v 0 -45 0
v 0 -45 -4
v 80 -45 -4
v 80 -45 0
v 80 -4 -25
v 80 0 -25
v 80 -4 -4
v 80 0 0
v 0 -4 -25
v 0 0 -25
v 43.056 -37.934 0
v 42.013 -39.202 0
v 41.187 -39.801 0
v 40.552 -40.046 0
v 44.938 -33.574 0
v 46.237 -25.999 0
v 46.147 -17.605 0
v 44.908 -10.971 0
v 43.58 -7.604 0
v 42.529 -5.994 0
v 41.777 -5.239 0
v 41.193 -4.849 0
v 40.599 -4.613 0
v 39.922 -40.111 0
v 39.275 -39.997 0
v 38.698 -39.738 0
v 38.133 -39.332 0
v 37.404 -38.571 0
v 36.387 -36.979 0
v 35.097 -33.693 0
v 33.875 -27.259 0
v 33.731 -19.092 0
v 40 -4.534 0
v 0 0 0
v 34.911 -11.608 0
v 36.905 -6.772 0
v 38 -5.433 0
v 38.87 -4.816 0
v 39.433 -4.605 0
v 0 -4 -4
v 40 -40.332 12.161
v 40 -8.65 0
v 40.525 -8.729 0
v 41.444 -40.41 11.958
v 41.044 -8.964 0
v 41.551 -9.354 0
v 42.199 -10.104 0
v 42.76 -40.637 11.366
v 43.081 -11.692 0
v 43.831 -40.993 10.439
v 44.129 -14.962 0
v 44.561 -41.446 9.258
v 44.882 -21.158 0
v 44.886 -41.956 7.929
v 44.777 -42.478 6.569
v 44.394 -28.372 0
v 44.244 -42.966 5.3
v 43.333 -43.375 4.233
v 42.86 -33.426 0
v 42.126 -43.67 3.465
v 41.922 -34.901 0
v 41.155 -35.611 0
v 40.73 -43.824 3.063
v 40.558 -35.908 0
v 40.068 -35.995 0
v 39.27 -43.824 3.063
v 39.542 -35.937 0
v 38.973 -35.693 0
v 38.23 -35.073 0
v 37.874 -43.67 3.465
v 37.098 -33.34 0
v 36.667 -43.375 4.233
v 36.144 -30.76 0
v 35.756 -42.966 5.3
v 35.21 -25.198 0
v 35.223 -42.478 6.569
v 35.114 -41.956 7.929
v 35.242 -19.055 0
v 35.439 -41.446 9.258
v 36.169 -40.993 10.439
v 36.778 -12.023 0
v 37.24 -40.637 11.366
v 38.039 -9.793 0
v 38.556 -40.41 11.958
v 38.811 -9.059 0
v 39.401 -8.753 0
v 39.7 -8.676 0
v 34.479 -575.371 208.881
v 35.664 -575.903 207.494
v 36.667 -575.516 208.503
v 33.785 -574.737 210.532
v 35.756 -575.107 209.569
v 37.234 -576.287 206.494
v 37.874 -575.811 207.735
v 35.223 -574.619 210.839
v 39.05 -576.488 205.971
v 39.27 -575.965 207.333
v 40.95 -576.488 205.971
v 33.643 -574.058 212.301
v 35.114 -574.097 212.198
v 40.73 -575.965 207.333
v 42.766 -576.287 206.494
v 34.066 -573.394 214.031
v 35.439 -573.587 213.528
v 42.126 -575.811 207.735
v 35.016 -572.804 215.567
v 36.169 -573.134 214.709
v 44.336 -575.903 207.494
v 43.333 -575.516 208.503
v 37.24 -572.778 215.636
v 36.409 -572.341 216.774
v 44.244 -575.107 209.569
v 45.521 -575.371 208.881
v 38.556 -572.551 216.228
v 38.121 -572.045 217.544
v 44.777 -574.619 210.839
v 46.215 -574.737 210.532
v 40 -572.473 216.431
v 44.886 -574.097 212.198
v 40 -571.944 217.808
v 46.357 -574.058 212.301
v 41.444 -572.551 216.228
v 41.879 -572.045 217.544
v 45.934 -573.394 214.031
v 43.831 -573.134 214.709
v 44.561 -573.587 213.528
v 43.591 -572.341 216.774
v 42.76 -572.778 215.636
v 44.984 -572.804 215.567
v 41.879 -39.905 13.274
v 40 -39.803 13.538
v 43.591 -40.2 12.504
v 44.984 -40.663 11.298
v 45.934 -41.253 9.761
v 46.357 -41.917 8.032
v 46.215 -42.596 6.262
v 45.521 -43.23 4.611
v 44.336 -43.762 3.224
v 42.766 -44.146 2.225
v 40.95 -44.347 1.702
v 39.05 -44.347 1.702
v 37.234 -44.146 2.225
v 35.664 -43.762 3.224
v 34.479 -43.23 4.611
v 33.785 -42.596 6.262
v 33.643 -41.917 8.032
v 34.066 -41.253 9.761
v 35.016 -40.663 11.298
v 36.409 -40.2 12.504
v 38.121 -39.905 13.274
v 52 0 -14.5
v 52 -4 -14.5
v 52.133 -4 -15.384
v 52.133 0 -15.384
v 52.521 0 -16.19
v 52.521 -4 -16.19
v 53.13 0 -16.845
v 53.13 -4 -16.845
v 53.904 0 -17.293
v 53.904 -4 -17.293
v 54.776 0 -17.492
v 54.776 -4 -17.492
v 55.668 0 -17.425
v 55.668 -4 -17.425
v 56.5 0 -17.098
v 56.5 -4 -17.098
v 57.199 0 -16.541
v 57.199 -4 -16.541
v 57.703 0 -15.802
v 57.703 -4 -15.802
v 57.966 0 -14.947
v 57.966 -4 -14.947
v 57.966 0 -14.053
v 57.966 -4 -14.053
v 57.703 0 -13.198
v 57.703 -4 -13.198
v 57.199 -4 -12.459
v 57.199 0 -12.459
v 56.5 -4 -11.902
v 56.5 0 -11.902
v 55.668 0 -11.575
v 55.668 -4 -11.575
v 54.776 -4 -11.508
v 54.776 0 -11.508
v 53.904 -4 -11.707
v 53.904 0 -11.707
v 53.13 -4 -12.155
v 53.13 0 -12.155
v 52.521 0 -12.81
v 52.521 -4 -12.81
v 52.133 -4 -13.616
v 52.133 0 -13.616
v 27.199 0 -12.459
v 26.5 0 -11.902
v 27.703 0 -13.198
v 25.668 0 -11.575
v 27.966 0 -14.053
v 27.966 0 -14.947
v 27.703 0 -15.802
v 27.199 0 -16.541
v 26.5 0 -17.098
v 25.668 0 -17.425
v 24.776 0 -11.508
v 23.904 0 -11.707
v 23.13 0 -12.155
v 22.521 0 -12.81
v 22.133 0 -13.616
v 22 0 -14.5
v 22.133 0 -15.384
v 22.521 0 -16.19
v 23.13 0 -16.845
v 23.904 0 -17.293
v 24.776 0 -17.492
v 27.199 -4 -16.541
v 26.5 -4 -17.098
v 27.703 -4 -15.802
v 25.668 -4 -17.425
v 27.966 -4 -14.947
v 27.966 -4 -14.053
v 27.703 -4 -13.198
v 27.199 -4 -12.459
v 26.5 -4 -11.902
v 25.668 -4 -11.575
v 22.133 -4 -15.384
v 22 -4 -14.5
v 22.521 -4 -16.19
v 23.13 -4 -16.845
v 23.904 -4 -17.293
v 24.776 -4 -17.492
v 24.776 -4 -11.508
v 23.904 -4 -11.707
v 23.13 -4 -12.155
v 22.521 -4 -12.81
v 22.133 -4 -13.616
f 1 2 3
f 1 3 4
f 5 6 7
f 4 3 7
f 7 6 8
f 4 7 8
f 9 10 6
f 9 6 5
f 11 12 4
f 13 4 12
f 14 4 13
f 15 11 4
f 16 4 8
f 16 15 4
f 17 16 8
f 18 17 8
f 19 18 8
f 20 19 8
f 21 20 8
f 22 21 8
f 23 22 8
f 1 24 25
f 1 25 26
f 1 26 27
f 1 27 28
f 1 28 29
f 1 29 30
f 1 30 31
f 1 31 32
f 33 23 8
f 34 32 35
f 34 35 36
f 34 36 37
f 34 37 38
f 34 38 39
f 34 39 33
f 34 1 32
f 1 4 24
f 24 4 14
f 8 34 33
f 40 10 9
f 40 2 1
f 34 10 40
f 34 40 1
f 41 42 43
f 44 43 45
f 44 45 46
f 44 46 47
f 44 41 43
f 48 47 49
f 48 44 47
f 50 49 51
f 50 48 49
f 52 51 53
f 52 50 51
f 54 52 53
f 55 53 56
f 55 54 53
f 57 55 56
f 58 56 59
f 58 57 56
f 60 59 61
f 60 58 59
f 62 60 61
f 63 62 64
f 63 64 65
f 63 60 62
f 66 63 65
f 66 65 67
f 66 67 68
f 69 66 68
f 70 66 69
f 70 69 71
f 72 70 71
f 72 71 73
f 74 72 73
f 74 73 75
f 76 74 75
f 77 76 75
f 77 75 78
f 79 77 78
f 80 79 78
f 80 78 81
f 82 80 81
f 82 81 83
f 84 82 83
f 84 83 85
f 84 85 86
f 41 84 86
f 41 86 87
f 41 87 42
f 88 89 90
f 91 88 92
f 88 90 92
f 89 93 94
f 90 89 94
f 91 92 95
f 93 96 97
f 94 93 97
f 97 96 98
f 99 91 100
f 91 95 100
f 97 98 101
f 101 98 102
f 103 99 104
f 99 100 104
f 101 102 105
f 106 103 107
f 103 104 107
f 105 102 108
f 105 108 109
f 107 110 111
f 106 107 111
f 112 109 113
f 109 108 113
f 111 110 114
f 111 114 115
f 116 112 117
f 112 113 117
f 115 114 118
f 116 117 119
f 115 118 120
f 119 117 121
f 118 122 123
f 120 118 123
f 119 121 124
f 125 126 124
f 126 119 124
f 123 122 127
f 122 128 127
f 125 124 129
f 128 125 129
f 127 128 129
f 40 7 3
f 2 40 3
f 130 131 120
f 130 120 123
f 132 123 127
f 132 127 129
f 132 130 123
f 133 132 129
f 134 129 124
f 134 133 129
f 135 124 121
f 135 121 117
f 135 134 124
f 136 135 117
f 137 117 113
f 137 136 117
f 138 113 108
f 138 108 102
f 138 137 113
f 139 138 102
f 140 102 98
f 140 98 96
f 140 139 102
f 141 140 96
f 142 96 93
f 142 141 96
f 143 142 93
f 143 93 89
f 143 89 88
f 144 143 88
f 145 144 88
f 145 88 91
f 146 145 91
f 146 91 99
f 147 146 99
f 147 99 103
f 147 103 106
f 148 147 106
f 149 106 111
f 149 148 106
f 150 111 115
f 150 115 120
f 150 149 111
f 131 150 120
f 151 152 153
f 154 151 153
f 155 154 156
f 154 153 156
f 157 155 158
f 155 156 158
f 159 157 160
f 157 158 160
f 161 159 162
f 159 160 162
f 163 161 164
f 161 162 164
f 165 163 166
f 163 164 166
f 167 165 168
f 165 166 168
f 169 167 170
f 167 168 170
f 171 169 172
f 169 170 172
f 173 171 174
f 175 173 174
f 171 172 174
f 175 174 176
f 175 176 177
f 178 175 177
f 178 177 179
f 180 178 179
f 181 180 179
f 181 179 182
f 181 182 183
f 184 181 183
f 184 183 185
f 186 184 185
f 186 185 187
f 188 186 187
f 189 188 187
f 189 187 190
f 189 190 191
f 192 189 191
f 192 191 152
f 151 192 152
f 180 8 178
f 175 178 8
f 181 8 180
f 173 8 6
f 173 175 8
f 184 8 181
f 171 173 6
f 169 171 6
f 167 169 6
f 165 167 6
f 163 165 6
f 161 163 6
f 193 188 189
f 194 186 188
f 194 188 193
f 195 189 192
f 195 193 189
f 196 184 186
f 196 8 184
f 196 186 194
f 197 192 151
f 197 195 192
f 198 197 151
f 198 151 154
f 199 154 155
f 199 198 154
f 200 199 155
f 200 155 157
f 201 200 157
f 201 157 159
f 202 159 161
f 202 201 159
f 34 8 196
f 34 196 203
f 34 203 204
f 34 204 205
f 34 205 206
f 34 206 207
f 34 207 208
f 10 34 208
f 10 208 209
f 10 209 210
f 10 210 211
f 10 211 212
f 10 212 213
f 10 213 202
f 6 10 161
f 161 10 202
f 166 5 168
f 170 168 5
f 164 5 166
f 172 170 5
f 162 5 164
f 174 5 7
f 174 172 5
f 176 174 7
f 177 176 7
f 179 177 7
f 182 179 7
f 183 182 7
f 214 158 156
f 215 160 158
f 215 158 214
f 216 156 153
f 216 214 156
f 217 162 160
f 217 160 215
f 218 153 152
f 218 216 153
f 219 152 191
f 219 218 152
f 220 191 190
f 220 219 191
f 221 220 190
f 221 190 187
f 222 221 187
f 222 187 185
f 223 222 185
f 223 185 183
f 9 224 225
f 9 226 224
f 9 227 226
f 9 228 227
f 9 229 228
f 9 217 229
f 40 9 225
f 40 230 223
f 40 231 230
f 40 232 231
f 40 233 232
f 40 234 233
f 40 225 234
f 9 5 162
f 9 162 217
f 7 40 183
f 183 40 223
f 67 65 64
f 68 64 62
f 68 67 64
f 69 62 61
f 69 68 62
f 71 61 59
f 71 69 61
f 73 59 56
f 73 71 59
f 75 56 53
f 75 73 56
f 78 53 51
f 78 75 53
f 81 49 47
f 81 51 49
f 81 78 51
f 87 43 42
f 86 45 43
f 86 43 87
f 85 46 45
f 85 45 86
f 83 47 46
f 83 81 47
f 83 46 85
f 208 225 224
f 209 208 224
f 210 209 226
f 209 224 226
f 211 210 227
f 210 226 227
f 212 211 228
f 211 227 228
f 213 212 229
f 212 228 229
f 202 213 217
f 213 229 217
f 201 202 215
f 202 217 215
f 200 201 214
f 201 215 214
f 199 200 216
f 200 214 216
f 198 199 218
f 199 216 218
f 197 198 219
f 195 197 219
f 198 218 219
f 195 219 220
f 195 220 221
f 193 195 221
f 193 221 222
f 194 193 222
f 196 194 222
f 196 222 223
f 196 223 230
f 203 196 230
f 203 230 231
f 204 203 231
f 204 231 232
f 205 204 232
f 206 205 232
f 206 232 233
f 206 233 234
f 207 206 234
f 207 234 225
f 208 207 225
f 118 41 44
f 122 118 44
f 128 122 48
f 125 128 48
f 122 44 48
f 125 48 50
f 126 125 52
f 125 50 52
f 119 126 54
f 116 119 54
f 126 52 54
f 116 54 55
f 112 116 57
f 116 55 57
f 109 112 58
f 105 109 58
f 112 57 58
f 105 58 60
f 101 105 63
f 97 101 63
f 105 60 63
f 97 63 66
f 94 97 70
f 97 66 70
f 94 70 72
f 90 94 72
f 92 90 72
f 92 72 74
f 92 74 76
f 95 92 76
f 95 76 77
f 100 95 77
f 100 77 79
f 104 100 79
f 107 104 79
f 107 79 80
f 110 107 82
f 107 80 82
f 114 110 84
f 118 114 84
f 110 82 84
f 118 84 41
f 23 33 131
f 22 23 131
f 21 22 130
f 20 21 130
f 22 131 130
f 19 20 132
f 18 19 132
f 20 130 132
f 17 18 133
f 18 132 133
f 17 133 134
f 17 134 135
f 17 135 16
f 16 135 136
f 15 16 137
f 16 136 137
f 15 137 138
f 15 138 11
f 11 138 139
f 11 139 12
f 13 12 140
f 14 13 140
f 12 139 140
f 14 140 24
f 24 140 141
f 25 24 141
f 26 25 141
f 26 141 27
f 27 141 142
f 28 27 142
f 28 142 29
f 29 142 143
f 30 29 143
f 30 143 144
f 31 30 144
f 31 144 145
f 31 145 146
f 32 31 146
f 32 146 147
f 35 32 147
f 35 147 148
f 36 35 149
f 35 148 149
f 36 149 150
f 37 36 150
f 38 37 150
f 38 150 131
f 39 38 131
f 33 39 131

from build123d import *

# Parameters (mm, degrees)
BOSS_EXTRUDE1_DEPTH             = 80
BOSS_EXTRUDE2_REACH             = 99.687
SKETCH2_R                       = 6.375
SKETCH2_R_2                     = 4.9
BOSS_EXTRUDE2_DIRECTION_2_DEPTH = 570
F_6_0MM_DOWEL_HOLE1_D           = 6


with BuildPart() as part:
    # Sketch1 → Boss-Extrude1 (new body)
    with BuildSketch(Plane(origin=(0, 0, 0), x_dir=(0, 0, -1), z_dir=(1, 0, 0))):
        Polygon((0, 0), (25, 0), (25, -4), (4, -4), (4, -45), (0, -45), align=None)
    extrude(amount=BOSS_EXTRUDE1_DEPTH)

    # Boss-Extrude2: up to this plane
    boss_extrude2_end = Plane(origin=(80, -45, 0), z_dir=(0, 0, -1))
    # Sketch2 → Boss-Extrude2 (add, up to the surface)
    with BuildSketch(Plane(origin=(0, -39.220758573, 15.055438643), x_dir=(-1, 0, 0), z_dir=(0, 0.9335804264972002, -0.3583679495453042)), mode=Mode.PRIVATE) as boss_extrude2_sk1:
        with Locations((-40, -8)):
            Circle(SKETCH2_R)
        with Locations((-40, -8)):
            Circle(SKETCH2_R_2, mode=Mode.SUBTRACT)
    boss_extrude2_tool1 = split(extrude(boss_extrude2_sk1.sketch, amount=BOSS_EXTRUDE2_REACH, mode=Mode.PRIVATE), bisect_by=boss_extrude2_end, keep=Keep.BOTH, mode=Mode.PRIVATE)
    add(boss_extrude2_tool1.solids().sort_by_distance((46.194688, -42.087702, 7.586795))[0])

    # Sketch2 → Boss-Extrude2 direction 2 (add)
    with BuildSketch(Plane(origin=(0, -39.220758573, 15.055438643), x_dir=(-1, 0, 0), z_dir=(0, 0.9335804264972002, -0.3583679495453042))):
        with Locations((-40, -8)):
            Circle(SKETCH2_R)
        with Locations((-40, -8)):
            Circle(SKETCH2_R_2, mode=Mode.SUBTRACT)
    extrude(amount=-BOSS_EXTRUDE2_DIRECTION_2_DEPTH)

    # Ø6.0mm Dowel Hole1 (through all)
    with Locations(Plane(origin=(0, 0, 0), x_dir=(1, 0, 0), z_dir=(0, 1, 0))):
        with Locations((25, 14.5), (55, 14.5)):
            Hole(F_6_0MM_DOWEL_HOLE1_D / 2)


solid = part.part
